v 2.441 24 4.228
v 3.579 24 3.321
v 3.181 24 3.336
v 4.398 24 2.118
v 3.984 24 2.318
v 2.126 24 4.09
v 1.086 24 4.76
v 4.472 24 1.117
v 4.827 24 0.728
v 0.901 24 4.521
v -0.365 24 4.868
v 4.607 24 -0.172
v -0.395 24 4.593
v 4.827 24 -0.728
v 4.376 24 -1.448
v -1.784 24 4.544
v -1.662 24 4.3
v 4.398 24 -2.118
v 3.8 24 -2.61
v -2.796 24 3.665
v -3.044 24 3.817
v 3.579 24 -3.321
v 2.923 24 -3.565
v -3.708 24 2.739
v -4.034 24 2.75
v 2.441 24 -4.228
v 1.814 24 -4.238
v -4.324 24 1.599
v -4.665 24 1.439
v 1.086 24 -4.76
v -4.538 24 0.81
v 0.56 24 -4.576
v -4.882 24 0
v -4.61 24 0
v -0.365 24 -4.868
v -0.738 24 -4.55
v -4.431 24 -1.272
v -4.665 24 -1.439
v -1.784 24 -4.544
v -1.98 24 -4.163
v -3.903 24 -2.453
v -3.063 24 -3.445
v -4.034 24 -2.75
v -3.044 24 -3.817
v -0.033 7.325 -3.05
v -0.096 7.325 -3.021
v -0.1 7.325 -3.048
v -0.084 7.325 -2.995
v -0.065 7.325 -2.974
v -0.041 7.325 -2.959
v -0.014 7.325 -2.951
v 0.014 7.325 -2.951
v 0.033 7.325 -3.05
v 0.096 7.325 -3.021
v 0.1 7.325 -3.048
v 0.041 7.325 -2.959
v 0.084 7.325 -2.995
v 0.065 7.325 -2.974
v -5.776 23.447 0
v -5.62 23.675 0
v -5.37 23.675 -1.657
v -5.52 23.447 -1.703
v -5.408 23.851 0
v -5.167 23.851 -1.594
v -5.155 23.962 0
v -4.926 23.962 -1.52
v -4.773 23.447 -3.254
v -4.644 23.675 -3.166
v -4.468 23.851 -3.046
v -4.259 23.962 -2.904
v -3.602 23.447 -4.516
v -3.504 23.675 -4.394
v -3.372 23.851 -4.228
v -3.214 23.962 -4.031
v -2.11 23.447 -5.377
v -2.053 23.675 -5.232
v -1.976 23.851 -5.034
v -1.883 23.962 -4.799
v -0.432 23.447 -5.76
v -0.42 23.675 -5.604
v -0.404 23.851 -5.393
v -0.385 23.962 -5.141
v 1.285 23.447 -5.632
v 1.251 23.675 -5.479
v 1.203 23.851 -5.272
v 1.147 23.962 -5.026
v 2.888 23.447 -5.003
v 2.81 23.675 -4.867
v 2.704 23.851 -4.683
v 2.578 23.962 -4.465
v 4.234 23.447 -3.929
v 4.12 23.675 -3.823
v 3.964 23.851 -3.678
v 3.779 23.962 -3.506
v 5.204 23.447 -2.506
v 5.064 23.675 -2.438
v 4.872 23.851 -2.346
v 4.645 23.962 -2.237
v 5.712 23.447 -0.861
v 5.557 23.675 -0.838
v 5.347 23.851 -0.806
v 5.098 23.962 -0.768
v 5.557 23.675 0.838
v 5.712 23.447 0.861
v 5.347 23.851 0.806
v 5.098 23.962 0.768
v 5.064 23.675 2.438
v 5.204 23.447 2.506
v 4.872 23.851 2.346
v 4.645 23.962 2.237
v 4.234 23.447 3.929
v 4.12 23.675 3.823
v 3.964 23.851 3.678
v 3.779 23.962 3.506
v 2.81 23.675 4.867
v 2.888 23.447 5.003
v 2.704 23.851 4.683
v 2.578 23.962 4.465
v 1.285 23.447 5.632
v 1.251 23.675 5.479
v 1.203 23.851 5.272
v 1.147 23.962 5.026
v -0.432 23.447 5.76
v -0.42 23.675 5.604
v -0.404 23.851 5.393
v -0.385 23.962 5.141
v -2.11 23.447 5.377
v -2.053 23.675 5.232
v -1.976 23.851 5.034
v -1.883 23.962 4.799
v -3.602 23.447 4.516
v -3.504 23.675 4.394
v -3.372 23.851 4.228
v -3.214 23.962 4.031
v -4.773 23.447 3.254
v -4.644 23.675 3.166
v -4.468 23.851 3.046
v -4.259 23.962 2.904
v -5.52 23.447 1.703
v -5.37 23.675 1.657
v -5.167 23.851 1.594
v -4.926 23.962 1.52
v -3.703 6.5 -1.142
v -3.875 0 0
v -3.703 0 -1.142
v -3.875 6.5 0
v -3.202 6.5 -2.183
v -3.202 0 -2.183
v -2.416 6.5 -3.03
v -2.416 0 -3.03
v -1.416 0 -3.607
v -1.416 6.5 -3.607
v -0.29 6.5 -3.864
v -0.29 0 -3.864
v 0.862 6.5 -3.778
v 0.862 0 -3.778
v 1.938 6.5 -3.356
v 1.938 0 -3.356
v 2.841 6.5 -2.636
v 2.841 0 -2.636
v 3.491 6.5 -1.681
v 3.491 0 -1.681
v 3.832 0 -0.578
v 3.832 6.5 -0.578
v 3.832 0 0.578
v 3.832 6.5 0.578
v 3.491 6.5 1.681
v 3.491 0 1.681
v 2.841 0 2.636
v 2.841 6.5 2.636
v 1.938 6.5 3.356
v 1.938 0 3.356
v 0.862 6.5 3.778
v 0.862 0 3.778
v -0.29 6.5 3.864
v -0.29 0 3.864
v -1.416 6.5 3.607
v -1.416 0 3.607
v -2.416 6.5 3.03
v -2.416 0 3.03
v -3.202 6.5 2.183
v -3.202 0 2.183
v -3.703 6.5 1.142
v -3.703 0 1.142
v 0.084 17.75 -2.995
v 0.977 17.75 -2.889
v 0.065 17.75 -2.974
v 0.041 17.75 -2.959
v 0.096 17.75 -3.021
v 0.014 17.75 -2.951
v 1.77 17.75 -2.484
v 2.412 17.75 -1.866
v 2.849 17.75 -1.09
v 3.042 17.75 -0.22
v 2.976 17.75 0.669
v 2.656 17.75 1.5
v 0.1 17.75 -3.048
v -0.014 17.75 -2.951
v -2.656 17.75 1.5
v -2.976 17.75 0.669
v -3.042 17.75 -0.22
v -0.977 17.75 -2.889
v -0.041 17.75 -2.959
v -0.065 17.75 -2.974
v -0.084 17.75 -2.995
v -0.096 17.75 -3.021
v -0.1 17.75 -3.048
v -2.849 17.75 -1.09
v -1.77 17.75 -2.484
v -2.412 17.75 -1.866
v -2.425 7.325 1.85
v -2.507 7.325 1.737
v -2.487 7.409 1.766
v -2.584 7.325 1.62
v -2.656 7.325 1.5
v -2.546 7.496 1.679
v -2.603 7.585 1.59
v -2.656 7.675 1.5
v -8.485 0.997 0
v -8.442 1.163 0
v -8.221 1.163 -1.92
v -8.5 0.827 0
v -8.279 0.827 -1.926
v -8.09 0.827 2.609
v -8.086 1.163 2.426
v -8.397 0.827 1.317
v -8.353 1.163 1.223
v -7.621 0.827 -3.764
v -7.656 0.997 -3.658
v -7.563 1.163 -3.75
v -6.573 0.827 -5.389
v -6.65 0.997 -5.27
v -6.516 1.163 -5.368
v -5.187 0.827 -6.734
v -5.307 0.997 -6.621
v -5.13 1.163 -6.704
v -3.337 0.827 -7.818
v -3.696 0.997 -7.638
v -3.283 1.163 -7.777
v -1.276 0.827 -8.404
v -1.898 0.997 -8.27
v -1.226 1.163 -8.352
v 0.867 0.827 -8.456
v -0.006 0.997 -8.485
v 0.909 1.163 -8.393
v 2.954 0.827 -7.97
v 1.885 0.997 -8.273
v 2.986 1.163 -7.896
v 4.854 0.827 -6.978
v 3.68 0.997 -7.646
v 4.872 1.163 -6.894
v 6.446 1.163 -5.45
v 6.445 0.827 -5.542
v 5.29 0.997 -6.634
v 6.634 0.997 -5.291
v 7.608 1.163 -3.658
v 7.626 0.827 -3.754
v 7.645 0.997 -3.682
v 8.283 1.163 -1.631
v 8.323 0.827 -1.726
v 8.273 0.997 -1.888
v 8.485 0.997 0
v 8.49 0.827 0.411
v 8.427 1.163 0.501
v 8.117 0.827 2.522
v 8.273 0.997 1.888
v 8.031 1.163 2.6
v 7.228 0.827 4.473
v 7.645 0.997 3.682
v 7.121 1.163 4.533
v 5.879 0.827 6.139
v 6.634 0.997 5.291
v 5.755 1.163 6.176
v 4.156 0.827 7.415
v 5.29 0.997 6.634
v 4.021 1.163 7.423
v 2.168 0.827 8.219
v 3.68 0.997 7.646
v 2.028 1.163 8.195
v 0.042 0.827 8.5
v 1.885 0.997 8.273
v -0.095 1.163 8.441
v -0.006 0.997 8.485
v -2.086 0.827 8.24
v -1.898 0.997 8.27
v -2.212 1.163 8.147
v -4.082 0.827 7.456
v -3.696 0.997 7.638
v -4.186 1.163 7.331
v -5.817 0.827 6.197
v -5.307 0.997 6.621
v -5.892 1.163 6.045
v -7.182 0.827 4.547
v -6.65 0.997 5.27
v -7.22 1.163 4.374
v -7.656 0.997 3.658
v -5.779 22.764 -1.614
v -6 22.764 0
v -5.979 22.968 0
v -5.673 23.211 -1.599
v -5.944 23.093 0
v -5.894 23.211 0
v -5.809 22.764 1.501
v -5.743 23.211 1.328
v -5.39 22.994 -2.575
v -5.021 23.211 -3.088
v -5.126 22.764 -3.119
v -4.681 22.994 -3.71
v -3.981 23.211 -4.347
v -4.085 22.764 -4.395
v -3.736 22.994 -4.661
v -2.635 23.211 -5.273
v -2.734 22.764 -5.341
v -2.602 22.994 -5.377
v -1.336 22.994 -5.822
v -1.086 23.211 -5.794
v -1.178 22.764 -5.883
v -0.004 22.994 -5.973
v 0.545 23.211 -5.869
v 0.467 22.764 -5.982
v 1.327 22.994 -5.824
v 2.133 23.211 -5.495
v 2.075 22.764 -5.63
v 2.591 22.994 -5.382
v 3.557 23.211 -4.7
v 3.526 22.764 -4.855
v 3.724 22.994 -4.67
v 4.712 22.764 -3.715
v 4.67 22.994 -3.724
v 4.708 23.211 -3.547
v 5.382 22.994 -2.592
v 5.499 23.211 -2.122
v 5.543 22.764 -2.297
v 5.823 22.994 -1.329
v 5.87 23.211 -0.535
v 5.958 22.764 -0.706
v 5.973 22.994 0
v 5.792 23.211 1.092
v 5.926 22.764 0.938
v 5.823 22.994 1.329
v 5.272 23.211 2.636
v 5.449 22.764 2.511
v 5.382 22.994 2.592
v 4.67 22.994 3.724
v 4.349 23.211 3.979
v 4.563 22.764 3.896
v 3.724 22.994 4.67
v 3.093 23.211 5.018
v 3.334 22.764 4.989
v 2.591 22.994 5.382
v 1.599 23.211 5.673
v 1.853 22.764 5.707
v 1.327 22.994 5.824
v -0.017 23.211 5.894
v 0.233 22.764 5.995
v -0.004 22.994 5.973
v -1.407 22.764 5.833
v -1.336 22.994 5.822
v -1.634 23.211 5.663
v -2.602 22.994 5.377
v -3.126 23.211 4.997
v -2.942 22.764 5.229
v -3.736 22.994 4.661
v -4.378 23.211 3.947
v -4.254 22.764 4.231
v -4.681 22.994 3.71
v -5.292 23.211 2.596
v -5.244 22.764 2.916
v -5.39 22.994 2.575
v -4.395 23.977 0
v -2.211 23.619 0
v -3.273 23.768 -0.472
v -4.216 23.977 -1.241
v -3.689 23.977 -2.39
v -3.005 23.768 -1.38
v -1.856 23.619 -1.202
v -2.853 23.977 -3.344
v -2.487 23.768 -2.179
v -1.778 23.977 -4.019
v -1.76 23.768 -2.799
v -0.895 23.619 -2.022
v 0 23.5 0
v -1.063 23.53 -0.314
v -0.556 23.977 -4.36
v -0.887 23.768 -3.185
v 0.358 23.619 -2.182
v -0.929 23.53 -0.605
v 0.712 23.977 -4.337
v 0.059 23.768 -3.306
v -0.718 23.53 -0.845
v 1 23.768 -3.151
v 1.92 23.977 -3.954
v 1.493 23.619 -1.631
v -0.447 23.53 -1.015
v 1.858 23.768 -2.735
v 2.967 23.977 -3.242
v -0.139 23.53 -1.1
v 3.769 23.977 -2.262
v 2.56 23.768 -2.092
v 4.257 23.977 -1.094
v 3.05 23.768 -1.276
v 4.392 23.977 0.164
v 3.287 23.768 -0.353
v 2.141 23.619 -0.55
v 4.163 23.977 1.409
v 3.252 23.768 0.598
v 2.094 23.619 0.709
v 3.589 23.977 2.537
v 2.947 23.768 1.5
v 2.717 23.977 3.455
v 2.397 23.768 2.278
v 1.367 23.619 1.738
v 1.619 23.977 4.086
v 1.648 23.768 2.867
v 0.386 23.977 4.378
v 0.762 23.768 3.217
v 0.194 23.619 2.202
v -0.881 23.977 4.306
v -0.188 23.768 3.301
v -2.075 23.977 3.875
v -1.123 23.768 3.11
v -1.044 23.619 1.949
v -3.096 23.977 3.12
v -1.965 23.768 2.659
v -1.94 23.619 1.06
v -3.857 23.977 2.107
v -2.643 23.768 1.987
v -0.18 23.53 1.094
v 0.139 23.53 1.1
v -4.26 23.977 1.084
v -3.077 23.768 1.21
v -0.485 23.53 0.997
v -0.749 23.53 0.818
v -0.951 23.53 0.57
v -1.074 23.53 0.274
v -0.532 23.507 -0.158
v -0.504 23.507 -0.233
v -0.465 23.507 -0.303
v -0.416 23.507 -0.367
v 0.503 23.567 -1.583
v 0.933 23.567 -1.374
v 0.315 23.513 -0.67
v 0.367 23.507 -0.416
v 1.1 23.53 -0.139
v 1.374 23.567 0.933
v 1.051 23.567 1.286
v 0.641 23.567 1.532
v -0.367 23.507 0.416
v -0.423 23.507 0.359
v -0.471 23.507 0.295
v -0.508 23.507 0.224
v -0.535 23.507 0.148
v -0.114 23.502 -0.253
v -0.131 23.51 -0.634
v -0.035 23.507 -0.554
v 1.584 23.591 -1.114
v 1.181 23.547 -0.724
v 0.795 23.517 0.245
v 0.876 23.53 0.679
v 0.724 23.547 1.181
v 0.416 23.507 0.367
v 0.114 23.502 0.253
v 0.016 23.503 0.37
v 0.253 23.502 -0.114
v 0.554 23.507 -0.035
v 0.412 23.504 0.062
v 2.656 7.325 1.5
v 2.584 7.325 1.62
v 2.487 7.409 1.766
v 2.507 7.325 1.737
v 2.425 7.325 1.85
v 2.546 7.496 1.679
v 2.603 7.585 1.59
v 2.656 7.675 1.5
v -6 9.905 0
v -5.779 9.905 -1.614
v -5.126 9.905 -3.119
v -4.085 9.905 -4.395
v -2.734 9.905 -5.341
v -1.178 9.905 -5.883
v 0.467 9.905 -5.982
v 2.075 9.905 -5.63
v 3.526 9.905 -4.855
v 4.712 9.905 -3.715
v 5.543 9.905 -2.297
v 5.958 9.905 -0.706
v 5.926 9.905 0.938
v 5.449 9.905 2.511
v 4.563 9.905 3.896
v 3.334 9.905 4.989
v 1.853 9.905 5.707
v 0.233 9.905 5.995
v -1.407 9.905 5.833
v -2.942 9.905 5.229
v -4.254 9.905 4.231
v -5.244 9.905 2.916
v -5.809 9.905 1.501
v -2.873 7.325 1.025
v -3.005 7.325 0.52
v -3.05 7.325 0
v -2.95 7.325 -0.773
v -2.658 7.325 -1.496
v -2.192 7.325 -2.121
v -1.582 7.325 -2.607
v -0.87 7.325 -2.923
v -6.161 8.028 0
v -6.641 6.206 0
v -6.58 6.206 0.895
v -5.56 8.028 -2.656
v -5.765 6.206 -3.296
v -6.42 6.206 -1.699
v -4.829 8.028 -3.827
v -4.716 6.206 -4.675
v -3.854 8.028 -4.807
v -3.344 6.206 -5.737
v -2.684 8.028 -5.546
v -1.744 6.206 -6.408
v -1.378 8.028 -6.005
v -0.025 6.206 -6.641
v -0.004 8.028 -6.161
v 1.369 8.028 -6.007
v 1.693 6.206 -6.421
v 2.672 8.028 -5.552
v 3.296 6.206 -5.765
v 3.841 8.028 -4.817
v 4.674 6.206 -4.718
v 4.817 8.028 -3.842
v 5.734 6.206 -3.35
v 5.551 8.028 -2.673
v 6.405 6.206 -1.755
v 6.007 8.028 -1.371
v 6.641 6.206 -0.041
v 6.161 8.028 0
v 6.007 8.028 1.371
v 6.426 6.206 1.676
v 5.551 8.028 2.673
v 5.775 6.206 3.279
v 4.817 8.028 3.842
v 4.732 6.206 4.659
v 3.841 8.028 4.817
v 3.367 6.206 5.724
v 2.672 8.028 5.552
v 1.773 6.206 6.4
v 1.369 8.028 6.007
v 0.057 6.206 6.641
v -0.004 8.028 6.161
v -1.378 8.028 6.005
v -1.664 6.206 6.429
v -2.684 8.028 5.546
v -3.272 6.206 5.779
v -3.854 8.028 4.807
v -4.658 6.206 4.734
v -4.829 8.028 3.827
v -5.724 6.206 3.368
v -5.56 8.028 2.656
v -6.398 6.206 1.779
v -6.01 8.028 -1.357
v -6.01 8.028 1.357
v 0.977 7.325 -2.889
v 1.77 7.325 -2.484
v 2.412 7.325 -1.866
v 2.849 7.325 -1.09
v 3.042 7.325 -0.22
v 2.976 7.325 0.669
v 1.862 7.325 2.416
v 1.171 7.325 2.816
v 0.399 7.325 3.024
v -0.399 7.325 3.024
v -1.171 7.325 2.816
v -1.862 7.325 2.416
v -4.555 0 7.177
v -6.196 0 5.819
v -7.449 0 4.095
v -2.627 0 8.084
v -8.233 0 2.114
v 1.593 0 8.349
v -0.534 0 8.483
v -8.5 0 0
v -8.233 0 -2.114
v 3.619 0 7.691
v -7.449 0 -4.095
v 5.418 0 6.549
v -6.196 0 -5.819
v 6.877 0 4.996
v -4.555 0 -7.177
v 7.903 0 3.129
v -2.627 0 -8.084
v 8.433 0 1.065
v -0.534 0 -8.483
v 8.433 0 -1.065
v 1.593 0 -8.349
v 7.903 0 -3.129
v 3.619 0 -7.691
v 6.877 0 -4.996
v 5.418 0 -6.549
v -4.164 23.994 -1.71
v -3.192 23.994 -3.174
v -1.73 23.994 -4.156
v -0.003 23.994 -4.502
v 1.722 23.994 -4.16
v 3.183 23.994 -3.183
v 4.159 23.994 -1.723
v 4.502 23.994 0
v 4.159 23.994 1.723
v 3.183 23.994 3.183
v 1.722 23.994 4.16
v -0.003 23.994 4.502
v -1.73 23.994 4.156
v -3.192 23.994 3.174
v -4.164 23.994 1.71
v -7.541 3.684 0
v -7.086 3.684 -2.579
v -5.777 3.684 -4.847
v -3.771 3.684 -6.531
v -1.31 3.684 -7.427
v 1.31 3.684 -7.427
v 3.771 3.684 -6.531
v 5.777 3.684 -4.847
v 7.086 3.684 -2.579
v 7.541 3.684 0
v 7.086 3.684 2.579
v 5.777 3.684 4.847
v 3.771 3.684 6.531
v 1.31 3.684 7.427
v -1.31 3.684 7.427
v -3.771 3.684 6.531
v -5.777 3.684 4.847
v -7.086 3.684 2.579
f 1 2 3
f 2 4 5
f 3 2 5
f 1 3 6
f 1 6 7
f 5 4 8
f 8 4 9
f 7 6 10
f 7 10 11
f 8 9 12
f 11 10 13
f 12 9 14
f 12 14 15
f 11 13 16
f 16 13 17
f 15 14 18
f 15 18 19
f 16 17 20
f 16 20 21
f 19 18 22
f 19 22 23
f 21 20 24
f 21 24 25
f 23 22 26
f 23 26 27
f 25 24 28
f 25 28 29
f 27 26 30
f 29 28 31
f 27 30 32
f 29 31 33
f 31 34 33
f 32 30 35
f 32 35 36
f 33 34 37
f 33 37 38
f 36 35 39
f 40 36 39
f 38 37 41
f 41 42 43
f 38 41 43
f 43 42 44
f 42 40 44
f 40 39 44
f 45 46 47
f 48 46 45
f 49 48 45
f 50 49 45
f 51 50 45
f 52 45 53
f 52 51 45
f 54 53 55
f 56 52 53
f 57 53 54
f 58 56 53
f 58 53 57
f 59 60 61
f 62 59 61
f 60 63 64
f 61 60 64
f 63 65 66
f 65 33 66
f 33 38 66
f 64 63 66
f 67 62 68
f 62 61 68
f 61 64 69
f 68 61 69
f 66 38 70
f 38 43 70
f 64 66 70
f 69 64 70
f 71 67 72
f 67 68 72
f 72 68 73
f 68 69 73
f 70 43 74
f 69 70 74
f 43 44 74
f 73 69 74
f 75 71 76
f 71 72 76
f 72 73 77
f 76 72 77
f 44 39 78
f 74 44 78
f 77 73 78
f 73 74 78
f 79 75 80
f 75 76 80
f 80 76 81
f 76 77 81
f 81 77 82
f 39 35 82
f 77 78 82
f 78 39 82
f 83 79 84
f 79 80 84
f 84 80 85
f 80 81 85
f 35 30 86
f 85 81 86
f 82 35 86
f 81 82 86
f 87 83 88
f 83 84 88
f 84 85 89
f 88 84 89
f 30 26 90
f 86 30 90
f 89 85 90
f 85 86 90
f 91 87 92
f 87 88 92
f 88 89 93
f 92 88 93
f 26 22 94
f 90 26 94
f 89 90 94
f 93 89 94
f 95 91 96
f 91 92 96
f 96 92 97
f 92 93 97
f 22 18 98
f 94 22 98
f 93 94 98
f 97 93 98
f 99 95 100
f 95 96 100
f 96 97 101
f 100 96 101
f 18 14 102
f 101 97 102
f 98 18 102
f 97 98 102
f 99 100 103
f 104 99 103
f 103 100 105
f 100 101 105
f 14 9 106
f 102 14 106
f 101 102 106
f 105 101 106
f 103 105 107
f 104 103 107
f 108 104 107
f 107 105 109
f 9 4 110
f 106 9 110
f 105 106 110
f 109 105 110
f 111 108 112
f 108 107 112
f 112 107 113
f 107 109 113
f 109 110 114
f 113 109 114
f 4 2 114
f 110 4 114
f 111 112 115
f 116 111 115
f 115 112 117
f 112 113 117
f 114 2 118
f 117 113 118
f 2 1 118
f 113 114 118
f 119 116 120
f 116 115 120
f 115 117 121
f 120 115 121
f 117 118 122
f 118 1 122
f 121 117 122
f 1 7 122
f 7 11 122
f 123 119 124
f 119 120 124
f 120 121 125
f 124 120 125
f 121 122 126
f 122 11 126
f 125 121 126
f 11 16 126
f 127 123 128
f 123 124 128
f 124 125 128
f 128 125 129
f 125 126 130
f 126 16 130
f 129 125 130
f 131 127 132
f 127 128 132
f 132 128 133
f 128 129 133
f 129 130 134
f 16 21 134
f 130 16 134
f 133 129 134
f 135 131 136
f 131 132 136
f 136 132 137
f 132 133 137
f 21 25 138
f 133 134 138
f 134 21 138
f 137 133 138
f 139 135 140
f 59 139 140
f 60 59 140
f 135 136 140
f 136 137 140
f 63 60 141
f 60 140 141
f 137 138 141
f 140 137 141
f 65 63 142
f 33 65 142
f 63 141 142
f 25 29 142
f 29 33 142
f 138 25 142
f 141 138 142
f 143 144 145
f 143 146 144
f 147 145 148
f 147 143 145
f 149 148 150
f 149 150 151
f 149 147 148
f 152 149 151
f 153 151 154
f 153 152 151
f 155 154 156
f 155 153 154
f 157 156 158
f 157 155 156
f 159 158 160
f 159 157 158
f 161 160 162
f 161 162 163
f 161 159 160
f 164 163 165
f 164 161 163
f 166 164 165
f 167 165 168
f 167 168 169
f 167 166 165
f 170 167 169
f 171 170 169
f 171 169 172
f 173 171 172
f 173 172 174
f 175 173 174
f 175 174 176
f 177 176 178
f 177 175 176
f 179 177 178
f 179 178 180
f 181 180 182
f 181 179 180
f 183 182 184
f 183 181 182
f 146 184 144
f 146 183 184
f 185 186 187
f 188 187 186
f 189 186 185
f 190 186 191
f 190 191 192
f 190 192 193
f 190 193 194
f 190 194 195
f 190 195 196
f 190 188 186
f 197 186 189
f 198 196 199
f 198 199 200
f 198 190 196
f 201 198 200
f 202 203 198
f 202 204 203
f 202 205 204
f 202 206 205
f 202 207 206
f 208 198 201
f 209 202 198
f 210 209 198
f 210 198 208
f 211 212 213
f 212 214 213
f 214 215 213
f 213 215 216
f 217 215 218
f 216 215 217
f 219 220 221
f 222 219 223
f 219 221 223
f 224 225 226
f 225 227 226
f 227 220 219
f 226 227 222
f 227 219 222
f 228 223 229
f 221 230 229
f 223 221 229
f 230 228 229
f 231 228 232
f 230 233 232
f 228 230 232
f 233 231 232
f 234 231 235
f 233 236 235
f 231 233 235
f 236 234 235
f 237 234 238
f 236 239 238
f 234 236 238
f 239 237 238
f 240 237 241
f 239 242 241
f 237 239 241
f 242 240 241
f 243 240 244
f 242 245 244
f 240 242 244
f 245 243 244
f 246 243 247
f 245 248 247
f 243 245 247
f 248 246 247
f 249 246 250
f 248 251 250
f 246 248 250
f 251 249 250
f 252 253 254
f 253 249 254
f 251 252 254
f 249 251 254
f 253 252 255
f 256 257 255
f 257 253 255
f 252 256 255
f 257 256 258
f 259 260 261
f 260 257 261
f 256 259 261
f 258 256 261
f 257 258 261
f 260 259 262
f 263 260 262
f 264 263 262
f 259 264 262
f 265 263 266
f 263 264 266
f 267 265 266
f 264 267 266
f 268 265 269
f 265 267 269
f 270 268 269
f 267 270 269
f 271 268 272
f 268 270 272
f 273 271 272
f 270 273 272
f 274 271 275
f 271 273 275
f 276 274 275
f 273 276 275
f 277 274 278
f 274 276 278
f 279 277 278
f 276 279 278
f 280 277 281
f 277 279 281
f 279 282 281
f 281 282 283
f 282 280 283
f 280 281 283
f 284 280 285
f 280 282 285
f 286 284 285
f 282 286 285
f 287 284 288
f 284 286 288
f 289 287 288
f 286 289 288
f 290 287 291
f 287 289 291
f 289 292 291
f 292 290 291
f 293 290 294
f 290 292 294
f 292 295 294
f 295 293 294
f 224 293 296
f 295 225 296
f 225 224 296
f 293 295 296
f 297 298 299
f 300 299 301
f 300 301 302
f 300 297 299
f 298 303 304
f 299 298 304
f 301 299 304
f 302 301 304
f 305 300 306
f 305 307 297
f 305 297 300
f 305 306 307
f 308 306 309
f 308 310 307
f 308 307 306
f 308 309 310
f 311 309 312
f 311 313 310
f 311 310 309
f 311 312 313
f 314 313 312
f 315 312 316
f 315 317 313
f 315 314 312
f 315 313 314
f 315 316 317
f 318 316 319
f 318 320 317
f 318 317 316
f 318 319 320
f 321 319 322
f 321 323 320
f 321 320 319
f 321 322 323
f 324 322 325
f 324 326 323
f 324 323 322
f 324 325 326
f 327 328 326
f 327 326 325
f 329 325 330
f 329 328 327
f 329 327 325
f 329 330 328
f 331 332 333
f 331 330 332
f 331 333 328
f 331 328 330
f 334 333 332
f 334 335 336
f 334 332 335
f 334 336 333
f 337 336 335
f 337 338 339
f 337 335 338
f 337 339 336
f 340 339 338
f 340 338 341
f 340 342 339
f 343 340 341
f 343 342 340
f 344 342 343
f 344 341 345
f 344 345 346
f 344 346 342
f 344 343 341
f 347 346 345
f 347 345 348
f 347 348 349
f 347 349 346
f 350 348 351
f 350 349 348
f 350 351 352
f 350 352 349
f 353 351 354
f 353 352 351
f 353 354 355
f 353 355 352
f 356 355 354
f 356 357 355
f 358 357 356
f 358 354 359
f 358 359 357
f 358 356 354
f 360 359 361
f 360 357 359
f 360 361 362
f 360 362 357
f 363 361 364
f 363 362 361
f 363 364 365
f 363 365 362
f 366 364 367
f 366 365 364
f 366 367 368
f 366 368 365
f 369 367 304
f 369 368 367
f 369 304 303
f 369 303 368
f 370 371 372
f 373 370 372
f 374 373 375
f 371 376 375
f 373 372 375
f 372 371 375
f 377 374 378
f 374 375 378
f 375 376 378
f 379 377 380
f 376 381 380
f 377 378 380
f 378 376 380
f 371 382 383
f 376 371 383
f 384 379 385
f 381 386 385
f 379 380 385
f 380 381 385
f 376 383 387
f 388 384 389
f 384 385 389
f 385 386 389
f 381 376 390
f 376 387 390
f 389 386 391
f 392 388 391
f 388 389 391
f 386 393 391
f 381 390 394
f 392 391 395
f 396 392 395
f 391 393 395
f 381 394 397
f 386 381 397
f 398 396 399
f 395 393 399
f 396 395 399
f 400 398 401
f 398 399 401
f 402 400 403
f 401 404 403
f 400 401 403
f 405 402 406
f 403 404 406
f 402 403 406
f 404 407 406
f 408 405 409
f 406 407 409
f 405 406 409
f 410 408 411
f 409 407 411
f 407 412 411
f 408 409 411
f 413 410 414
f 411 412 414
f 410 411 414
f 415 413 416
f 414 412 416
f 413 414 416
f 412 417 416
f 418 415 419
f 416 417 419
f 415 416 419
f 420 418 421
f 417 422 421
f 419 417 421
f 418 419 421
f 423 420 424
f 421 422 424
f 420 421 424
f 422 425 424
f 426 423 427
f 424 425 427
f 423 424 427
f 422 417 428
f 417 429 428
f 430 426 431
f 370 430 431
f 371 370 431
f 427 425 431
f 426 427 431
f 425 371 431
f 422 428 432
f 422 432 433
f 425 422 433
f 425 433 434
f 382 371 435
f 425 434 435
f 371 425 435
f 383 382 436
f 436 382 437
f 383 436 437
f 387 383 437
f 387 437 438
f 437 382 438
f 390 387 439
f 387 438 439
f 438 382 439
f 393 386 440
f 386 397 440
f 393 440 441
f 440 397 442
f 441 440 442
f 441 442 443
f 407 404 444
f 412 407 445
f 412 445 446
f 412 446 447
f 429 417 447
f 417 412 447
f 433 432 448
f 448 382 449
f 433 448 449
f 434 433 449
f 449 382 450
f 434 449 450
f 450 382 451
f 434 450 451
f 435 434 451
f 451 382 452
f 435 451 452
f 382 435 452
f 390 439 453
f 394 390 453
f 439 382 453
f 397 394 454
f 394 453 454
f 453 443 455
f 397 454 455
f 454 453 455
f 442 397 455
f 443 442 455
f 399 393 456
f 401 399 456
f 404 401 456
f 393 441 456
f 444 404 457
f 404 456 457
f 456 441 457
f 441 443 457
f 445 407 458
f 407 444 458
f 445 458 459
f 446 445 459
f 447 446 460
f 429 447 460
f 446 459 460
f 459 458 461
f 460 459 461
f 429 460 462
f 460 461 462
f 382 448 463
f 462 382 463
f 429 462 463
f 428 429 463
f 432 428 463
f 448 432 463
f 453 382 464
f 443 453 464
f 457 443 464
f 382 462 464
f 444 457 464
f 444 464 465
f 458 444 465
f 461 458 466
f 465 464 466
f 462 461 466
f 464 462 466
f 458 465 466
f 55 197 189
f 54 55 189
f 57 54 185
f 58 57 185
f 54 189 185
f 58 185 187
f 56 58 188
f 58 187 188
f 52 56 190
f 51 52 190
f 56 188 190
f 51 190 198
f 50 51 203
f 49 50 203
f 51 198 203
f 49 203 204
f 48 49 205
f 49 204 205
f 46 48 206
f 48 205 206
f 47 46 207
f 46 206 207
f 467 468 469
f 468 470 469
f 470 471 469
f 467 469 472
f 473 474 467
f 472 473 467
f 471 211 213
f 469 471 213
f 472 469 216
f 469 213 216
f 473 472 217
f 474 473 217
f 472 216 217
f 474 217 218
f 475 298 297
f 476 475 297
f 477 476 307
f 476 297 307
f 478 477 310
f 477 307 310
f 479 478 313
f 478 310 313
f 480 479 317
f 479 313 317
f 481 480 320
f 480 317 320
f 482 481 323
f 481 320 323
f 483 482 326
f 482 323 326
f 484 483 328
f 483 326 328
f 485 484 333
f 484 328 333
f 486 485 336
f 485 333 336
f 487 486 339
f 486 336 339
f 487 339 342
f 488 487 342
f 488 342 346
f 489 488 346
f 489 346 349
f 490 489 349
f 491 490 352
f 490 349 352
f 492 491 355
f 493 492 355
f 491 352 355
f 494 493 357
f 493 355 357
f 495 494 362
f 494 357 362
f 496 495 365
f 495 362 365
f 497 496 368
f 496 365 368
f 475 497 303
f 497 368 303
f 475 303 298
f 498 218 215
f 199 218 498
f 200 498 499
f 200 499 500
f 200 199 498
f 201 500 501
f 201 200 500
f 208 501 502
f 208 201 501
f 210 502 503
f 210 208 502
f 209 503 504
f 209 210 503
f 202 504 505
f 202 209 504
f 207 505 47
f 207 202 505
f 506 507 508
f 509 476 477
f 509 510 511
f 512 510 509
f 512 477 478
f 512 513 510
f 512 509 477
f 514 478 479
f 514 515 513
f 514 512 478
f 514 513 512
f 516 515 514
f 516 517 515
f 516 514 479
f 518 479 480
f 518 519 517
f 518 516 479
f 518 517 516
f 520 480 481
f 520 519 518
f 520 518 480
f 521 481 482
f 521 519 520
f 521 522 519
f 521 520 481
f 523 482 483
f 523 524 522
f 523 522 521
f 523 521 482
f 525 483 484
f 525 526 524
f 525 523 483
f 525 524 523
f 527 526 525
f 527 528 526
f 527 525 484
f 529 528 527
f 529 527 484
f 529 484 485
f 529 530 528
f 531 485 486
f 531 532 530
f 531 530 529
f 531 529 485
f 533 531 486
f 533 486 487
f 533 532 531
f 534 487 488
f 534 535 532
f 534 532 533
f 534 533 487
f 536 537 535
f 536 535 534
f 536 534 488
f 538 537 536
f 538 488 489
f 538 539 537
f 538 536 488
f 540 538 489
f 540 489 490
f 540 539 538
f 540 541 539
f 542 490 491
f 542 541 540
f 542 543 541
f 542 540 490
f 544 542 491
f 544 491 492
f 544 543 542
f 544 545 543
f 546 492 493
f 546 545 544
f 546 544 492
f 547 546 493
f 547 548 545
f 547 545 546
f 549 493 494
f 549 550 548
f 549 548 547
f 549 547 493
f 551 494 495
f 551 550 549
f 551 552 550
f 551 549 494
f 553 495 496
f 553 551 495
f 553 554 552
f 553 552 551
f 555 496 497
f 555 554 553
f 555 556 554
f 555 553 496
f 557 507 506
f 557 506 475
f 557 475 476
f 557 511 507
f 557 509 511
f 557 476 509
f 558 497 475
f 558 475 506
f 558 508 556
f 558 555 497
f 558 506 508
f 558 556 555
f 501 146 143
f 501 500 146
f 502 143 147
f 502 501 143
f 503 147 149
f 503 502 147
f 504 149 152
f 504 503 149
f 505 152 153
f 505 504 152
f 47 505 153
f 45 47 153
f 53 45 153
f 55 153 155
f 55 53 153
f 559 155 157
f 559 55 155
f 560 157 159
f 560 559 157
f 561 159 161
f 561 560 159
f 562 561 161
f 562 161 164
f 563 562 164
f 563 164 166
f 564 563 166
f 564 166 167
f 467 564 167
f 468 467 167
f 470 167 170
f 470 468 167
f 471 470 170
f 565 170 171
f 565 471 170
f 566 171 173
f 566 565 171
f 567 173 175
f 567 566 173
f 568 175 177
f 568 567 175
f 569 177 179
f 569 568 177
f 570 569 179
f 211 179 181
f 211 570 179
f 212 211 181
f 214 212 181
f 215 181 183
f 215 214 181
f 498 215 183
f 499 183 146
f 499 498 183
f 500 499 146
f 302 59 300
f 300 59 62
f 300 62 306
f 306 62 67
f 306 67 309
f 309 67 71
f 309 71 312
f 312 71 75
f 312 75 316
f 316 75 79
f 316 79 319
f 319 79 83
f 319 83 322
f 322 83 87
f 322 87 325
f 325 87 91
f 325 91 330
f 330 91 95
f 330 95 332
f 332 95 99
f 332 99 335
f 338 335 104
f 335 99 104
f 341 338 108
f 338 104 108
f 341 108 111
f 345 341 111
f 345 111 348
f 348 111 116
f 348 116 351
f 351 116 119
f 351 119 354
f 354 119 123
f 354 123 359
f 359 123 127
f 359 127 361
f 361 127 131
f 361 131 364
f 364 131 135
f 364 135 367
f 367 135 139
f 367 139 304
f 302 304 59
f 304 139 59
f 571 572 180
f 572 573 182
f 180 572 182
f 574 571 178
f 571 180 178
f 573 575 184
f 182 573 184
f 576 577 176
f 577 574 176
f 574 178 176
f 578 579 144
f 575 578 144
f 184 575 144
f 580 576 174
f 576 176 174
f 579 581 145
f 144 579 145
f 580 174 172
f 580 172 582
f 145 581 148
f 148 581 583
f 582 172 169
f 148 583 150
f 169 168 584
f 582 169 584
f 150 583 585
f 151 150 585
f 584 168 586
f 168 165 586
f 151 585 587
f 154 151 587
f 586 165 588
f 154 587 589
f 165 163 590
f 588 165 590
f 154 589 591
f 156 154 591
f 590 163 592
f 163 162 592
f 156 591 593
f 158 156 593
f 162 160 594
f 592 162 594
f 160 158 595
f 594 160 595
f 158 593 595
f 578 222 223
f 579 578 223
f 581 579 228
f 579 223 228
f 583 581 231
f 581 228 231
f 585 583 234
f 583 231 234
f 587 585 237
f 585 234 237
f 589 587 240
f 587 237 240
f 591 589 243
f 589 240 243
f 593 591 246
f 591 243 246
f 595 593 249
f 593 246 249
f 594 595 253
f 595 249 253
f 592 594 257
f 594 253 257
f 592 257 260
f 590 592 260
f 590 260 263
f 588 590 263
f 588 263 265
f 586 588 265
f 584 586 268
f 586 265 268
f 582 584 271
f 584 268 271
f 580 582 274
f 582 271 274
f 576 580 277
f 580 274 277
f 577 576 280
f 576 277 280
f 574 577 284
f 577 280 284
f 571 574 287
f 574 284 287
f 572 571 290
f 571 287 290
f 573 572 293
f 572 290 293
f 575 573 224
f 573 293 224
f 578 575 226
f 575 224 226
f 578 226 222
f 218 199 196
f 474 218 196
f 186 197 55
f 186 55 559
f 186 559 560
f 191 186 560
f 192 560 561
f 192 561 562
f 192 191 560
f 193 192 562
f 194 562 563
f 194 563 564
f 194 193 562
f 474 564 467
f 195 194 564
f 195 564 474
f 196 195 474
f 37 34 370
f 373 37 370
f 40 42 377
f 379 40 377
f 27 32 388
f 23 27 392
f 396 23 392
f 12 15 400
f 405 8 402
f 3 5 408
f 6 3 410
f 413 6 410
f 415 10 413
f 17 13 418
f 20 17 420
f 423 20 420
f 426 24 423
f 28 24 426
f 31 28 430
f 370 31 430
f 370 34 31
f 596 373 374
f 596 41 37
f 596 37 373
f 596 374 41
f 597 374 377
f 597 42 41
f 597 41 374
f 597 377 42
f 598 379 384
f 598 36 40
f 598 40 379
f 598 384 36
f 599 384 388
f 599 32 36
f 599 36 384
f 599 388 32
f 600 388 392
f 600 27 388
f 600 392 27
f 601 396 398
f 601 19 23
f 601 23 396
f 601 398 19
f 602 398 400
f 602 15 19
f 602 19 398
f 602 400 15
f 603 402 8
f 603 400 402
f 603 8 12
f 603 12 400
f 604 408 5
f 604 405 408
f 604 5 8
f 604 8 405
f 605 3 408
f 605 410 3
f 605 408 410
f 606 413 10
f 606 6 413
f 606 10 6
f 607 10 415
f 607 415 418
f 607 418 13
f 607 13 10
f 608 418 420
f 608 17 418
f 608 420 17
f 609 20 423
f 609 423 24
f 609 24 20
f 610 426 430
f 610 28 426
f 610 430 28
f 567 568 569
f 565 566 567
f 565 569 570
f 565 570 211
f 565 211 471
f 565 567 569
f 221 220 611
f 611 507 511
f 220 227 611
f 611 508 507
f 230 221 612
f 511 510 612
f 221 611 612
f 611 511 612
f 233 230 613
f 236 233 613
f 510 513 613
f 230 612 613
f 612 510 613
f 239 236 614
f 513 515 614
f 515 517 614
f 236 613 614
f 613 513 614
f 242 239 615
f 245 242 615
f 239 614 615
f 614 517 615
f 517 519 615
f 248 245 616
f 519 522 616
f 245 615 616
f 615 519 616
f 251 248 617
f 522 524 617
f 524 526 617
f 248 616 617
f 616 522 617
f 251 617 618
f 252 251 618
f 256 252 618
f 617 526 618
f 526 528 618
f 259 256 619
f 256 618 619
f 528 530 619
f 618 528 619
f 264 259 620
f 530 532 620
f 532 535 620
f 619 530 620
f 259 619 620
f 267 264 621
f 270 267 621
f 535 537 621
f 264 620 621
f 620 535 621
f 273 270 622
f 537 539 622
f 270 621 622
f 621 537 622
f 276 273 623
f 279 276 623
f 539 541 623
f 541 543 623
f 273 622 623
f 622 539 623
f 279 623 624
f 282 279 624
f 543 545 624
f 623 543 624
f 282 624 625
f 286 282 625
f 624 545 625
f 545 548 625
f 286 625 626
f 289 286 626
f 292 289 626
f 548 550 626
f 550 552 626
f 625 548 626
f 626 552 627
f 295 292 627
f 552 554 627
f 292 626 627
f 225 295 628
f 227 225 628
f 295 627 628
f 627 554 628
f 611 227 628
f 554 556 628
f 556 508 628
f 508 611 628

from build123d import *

# Parameters (mm, degrees)
FILLET1_R           = 11
FILLET2_R           = 1
BOSS_EXTRUDE1_DEPTH = 10.425
CHAMFER1_SIZE       = 0.35


with BuildPart() as part:
    # Sketch1 → Revolve1 (revolve)
    with BuildSketch(Plane.XY, mode=Mode.PRIVATE) as revolve1_sk:
        with BuildLine():
            Line((0, 0), (8.5, 0))
            Line((8.5, 0), (8.5, 1))
            Line((8.5, 1), (6, 8))
            Line((6, 8), (6, 23))
            Line((6, 23), (5.5, 24))
            Line((5.5, 24), (4.5, 24))
            add(Edge.make_bspline(
                [(4.5, 24), (2.277777778, 23.5), (0, 23.5)],
                knots=[0, 0, 0, 1, 1, 1], degree=2))
            Line((0, 23.5), (0, 0))
        make_face()
    revolve(revolve1_sk.sketch.rotate(Axis((0, 23.5, 0), (0, -1, 0)), 180), axis=Axis((0, 23.5, 0), (0, -1, 0)))

    # Fillet1
    fillet1_edges = [part.edges().sort_by_distance(p)[0] for p in [
        (6, 8, 0),
    ]]
    fillet(fillet1_edges, radius=FILLET1_R)

    # Fillet2
    fillet2_edges = [part.edges().sort_by_distance(p)[0] for p in [
        (4.5, 24, 0),
        (5.5, 24, 0),
        (6, 23, 0),
        (8.5, 1, 0),
    ]]
    fillet(fillet2_edges, radius=FILLET2_R)

    # Sketch3 → Cut-Revolve1 (revolve, cut)
    with BuildSketch(Plane.XY, mode=Mode.PRIVATE) as cut_revolve1_sk:
        Polygon((0, 0), (3.875, 0), (3.875, 6.5), (3.05, 7.325), (3.05, 17.75), (0, 17.75), align=None)
    revolve(cut_revolve1_sk.sketch.rotate(Axis((0, 17.75, 0), (0, -1, 0)), 180), axis=Axis((0, 17.75, 0), (0, -1, 0)), mode=Mode.SUBTRACT)

    # Sketch4 → Boss-Extrude1 (add)
    with BuildSketch(Plane.XZ.offset(-17.75)):
        with BuildLine():
            Line((-2.655654345, 1.5), (2.655654345, 1.5))
            ThreePointArc((2.655654345, 1.5), (0, 3.05), (-2.655654345, 1.5))
        make_face()
        with BuildLine():
            ThreePointArc((-0.099986562, -3.048360656), (0, -3.05), (0.099986562, -3.048360656))
            ThreePointArc((0.099986562, -3.048360656), (0, -2.95), (-0.099986562, -3.048360656))
        make_face()
    extrude(amount=BOSS_EXTRUDE1_DEPTH)

    # Chamfer1
    # the kernel refuses this chamfer: 0.35 mm, written as the material it takes off along each edge
    with BuildSketch(Plane(origin=(-3.555743391, 7.325, 1.5), x_dir=(0, -0.02749587661058614, 0.9996219169112968), z_dir=(1, 0, 0))) as chamfer1_piece_1_section:
        Polygon((CHAMFER1_SIZE * 0.999621916911, -CHAMFER1_SIZE * 0.0274958766106), (-CHAMFER1_SIZE * 0.0274958766106, -CHAMFER1_SIZE * 0.999621916911), (0, 0), align=None)
    chamfer1_piece_1 = extrude(amount=7.111486782, mode=Mode.PRIVATE)
    chamfer1_piece_1 = chamfer1_piece_1 & Plane(origin=(0, 7.499624527, 0), x_dir=(-1, 0, 0), z_dir=(0, 1, 0)) * Cylinder(3.05, 16, mode=Mode.PRIVATE)
    add(chamfer1_piece_1, mode=Mode.SUBTRACT)


solid = part.part
